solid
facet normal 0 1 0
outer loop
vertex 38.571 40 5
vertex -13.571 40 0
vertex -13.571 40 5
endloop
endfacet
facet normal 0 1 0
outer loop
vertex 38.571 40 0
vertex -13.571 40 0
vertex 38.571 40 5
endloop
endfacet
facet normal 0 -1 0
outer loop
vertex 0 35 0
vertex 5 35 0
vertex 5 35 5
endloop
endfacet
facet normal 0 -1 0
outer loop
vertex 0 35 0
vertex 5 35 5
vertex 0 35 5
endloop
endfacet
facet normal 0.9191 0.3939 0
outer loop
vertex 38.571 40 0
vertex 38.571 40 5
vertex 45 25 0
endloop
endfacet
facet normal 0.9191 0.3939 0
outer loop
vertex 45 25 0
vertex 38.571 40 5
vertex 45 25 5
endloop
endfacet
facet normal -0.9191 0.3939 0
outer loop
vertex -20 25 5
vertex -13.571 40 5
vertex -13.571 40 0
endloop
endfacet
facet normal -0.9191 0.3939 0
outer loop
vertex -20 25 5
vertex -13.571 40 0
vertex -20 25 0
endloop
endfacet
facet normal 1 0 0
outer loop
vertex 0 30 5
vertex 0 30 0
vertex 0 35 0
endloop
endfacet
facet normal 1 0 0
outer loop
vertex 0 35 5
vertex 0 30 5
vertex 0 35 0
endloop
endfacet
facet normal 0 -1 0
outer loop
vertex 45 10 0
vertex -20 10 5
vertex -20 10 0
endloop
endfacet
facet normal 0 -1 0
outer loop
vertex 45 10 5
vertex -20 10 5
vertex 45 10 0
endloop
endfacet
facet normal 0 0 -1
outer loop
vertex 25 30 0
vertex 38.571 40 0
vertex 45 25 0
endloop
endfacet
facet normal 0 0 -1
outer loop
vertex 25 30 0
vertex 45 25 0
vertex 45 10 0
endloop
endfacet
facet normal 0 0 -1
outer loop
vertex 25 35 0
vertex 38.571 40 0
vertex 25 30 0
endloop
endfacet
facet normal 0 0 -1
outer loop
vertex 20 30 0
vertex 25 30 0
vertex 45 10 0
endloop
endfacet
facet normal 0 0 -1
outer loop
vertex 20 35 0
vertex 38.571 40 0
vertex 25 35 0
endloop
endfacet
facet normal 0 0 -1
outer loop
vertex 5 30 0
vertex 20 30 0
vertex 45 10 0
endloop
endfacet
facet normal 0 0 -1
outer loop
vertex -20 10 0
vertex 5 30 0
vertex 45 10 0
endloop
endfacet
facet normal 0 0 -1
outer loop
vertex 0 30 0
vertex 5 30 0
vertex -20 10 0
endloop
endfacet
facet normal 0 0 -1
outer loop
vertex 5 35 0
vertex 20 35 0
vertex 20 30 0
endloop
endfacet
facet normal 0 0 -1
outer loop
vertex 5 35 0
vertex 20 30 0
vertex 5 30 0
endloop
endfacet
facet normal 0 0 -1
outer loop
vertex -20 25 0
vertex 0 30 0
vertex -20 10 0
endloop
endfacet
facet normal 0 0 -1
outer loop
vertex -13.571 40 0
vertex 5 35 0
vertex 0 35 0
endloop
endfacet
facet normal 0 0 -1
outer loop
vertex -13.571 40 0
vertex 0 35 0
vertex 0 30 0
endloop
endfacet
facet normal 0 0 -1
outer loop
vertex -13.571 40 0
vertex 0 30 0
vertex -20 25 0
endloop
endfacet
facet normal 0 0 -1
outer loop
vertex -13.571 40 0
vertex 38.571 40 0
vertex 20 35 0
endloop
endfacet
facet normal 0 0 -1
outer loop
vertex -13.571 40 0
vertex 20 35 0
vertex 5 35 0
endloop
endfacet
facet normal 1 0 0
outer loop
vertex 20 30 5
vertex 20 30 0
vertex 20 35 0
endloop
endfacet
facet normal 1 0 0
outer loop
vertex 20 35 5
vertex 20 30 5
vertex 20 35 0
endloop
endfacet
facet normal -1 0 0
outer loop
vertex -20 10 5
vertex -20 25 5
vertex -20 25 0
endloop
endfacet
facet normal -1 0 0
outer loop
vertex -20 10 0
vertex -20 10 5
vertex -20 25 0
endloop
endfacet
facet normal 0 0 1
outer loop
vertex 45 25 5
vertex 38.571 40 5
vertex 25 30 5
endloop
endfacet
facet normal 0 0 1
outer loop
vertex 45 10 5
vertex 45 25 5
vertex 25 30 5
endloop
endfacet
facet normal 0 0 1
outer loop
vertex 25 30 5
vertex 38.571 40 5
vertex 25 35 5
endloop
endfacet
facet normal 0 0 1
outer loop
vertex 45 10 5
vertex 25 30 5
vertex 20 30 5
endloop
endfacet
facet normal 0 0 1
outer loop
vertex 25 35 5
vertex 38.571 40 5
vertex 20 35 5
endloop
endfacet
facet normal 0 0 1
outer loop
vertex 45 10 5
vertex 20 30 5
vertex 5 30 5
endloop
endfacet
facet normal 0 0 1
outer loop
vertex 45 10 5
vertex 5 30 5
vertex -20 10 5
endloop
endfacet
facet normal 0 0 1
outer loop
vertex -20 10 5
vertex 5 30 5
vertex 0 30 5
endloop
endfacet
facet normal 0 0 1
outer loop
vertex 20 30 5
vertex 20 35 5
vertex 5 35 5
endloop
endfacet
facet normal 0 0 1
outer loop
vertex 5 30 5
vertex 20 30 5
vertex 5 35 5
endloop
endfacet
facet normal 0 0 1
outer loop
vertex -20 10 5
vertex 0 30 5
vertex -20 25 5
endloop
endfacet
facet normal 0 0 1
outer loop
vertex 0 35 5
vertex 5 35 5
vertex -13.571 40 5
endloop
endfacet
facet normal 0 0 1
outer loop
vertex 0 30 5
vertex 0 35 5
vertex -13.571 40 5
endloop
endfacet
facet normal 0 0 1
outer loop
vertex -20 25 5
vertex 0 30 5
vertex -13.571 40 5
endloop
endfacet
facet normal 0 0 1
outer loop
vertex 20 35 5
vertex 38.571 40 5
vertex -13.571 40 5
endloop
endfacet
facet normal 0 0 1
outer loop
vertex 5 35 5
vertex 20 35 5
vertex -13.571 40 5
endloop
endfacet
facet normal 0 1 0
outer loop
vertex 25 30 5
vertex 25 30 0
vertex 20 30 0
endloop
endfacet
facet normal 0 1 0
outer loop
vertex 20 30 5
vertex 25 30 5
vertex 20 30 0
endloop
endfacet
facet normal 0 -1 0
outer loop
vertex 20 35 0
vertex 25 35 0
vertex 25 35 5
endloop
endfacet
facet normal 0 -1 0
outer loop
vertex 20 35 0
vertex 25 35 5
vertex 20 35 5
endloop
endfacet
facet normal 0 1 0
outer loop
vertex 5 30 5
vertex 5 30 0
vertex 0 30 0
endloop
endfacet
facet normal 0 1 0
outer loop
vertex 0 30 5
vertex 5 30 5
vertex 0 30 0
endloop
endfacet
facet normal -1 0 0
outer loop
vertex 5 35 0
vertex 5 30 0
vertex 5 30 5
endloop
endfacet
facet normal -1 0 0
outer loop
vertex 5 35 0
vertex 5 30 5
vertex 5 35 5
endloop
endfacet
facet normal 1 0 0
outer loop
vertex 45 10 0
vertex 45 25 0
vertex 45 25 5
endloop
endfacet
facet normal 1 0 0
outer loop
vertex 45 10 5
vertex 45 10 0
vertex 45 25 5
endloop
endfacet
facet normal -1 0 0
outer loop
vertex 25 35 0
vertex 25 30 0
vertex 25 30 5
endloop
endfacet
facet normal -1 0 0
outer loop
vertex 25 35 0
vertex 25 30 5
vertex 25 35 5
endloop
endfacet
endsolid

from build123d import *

# Parameters (mm, degrees)
BOSS_EXTRUDE1_DEPTH  = 2
SKETCH2_W            = 5
SKETCH2_H            = 25
SKETCH2_W_2          = 20
BOSS_EXTRUDE2_DEPTH  = 20
SKETCH3_W            = 25
SKETCH3_H            = 2
BOSS_EXTRUDE3_DEPTH  = 25
SKETCH4_W            = 25
SKETCH4_H            = 25
BOSS_EXTRUDE4_DEPTH  = 7
BOSS_EXTRUDE5_DEPTH  = 5
SKETCH6_W            = 50
SKETCH6_H            = 25
BOSS_EXTRUDE6_DEPTH  = 5
BOSS_EXTRUDE7_DEPTH  = 30
CUT_EXTRUDE2_DEPTH   = 30
SKETCH10_W           = 5
SKETCH10_H           = 25
CUT_EXTRUDE3_DEPTH   = 20
SKETCH11_W           = 25
SKETCH11_H           = 25
CUT_EXTRUDE4_DEPTH   = 7
SKETCH13_W           = 5
SKETCH13_H           = 25
CUT_EXTRUDE5_DEPTH   = 10
BOSS_EXTRUDE8_REACH  = 12
SKETCH14_W           = 10
SKETCH14_H           = 5
SKETCH15_W           = 2.5
SKETCH15_H           = 25
CUT_EXTRUDE6_DEPTH   = 15
SKETCH16_W           = 5
SKETCH16_H           = 15
CUT_EXTRUDE7_DEPTH   = 26
SKETCH17_W           = 5
SKETCH17_H           = 15
CUT_EXTRUDE8_DEPTH   = 43.5
SKETCH18_W           = 5
SKETCH18_H           = 15
CUT_EXTRUDE9_DEPTH   = 6
CUT_EXTRUDE10_DEPTH  = 43.5
CUT_EXTRUDE11_DEPTH  = 43.5
SKETCH21_W           = 5
SKETCH21_H           = 5
SKETCH21_H_2         = 15
BOSS_EXTRUDE9_DEPTH  = 5
SKETCH22_W           = 5
SKETCH22_H           = 5
SKETCH22_W_2         = 50
SKETCH22_H_2         = 15
CUT_EXTRUDE12_DEPTH  = 6
SKETCH23_W           = 5
SKETCH23_H           = 5
CUT_EXTRUDE13_DEPTH  = 6
BOSS_EXTRUDE10_DEPTH = 15
BOSS_EXTRUDE11_DEPTH = 5
SKETCH26_W           = 65
SKETCH26_H           = 5
CUT_EXTRUDE14_DEPTH  = 20


with BuildPart() as part:
    # Sketch1 → Boss-Extrude1 (new body)
    with BuildSketch(Plane.XY):
        Polygon((-5, 75), (2.5, 25), (2.5, 0), (22.5, 0), (22.5, 25), (30, 75), (30, 100), (25, 100), (25, 75), (0, 75), (0, 100), (-5, 100), align=None)
    extrude(amount=BOSS_EXTRUDE1_DEPTH)

    # Sketch2 → Boss-Extrude2 (add)
    with BuildSketch(Plane(origin=(0, 0, 0), x_dir=(-1, 0, 0), z_dir=(0, 0, -1))):
        with Locations((-27.5, 87.5)):
            Rectangle(SKETCH2_W, SKETCH2_H)
        with Locations((2.5, 87.5)):
            Rectangle(SKETCH2_W, SKETCH2_H)
        with Locations((-12.5, 12.5)):
            Rectangle(SKETCH2_W_2, SKETCH2_H)
    extrude(amount=BOSS_EXTRUDE2_DEPTH)

    # Sketch3 → Boss-Extrude3 (add)
    with BuildSketch(Plane(origin=(0, 75, 0), x_dir=(1, 0, 0), z_dir=(0, 1, 0))):
        with Locations((12.5, -1)):
            Rectangle(SKETCH3_W, SKETCH3_H)
    extrude(amount=BOSS_EXTRUDE3_DEPTH)

    # Sketch4 → Boss-Extrude4 (add)
    with BuildSketch(Plane(origin=(0, 0, 0), x_dir=(-1, 0, 0), z_dir=(0, 0, -1))):
        with Locations((-12.5, 87.5)):
            Rectangle(SKETCH4_W, SKETCH4_H)
    extrude(amount=BOSS_EXTRUDE4_DEPTH)

    # Sketch5 → Boss-Extrude5 (add)
    with BuildSketch(Plane(origin=(0, 0, 0), x_dir=(-1, 0, 0), z_dir=(0, 0, -1))):
        Polygon((5, 75), (5, 0), (-2.5, 0), (-22.5, 0), (-30, 0), (-30, 75), (-30, 100), (5, 100), align=None)
    extrude(amount=-BOSS_EXTRUDE5_DEPTH)

    # Sketch6 → Boss-Extrude6 (add)
    with BuildSketch(Plane.XY.offset(5)):
        with Locations((12.5, 12.5)):
            Rectangle(SKETCH6_W, SKETCH6_H)
    extrude(amount=-BOSS_EXTRUDE6_DEPTH)

    # Sketch8 → Boss-Extrude7 (add)
    with BuildSketch(Plane.XZ.offset(-75)):
        Polygon((-5, 0), (-5, -20), (0, -20), (0, -7), (25, -7), (25, -20), (30, -20), (30, 0), align=None)
    extrude(amount=BOSS_EXTRUDE7_DEPTH)

    # Sketch9 → Cut-Extrude2 (cut)
    with BuildSketch(Plane(origin=(0, 100, 0), x_dir=(1, 0, 0), z_dir=(0, 1, 0))):
        Polygon((30, 20), (25, 20), (25, 7), (0, 7), (0, 20), (-5, 20), (-5, -5), (30, -5), align=None)
    extrude(amount=-CUT_EXTRUDE2_DEPTH, mode=Mode.SUBTRACT)

    # Sketch10 → Cut-Extrude3 (cut)
    with BuildSketch(Plane(origin=(0, 0, -20), x_dir=(-1, 0, 0), z_dir=(0, 0, -1))):
        with Locations((-20, 12.5)):
            Rectangle(SKETCH10_W, SKETCH10_H)
        with Locations((-5, 12.5)):
            Rectangle(SKETCH10_W, SKETCH10_H)
    extrude(amount=-CUT_EXTRUDE3_DEPTH, mode=Mode.SUBTRACT)

    # Sketch11 → Cut-Extrude4 (cut)
    with BuildSketch(Plane(origin=(0, 0, -7), x_dir=(-1, 0, 0), z_dir=(0, 0, -1))):
        with Locations((-12.5, 57.5)):
            Rectangle(SKETCH11_W, SKETCH11_H)
    extrude(amount=-CUT_EXTRUDE4_DEPTH, mode=Mode.SUBTRACT)

    # Sketch13 → Cut-Extrude5 (cut)
    with BuildSketch(Plane(origin=(17.5, 0, 0), x_dir=(0, 0, -1), z_dir=(1, 0, 0))):
        Polygon((5, 25), (5, 20), (10, 20), (10, 5), (0, 5), (0, 25), align=None)
        with Locations((17.5, 12.5)):
            Rectangle(SKETCH13_W, SKETCH13_H)
    extrude(amount=-CUT_EXTRUDE5_DEPTH, mode=Mode.SUBTRACT)

    # Sketch14 → Boss-Extrude8 (add, up to next)
    with BuildSketch(Plane.XY.offset(-5), mode=Mode.PRIVATE) as boss_extrude8_sk1:
        with Locations((12.5, 22.5)):
            Rectangle(SKETCH14_W, SKETCH14_H)
    boss_extrude8_tool1 = extrude(boss_extrude8_sk1.sketch, amount=BOSS_EXTRUDE8_REACH, mode=Mode.PRIVATE) - part.part
    add(boss_extrude8_tool1.solids().sort_by_distance((12.5, 22.5, -5))[0])

    # Sketch15 → Cut-Extrude6 (cut)
    with BuildSketch(Plane(origin=(0, 0, -15), x_dir=(-1, 0, 0), z_dir=(0, 0, -1))):
        with Locations((-8.75, 12.5)):
            Rectangle(SKETCH15_W, SKETCH15_H)
        with Locations((-16.25, 12.5)):
            Rectangle(SKETCH15_W, SKETCH15_H)
    extrude(amount=-CUT_EXTRUDE6_DEPTH, mode=Mode.SUBTRACT)

    # Sketch16 → Cut-Extrude7 (cut, through all)
    with BuildSketch(Plane.XY.offset(5)):
        with Locations((-5, 12.5)):
            Rectangle(SKETCH16_W, SKETCH16_H)
        with Locations((30, 12.5)):
            Rectangle(SKETCH16_W, SKETCH16_H)
    extrude(amount=-CUT_EXTRUDE7_DEPTH, mode=Mode.SUBTRACT)

    # Sketch17 → Cut-Extrude8 (cut, through all)
    with BuildSketch(Plane(origin=(30, 0, 0), x_dir=(0, 0, -1), z_dir=(1, 0, 0))):
        with Locations((2.5, 57.5)):
            Rectangle(SKETCH17_W, SKETCH17_H)
    extrude(amount=-CUT_EXTRUDE8_DEPTH, mode=Mode.SUBTRACT)

    # Sketch18 → Cut-Extrude9 (cut, through all)
    with BuildSketch(Plane(origin=(0, 0, 0), x_dir=(-1, 0, 0), z_dir=(0, 0, -1))):
        with Locations((-2.5, 57.5)):
            Rectangle(SKETCH18_W, SKETCH18_H)
        with Locations((-22.5, 57.5)):
            Rectangle(SKETCH18_W, SKETCH18_H)
    extrude(amount=-CUT_EXTRUDE9_DEPTH, mode=Mode.SUBTRACT)

    # Sketch19 → Cut-Extrude10 (cut, through all)
    with BuildSketch(Plane(origin=(30, 0, 0), x_dir=(0, 0, -1), z_dir=(1, 0, 0))):
        Polygon((5, 60), (10, 60), (10, 45), (20, 45), (20, 70), (-5, 70), (-5, 60), (0, 60), align=None)
    extrude(amount=-CUT_EXTRUDE10_DEPTH, mode=Mode.SUBTRACT)

    # Sketch20 → Cut-Extrude11 (cut, through all)
    with BuildSketch(Plane(origin=(30, 0, 0), x_dir=(0, 0, -1), z_dir=(1, 0, 0))):
        Polygon((10, 45), (15, 25), (15, 0), (0, 0), (0, 60), (10, 60), align=None)
    extrude(amount=-CUT_EXTRUDE11_DEPTH, mode=Mode.SUBTRACT)

    # Sketch21 → Boss-Extrude9 (add)
    with BuildSketch(Plane(origin=(0, 0, 0), x_dir=(-1, 0, 0), z_dir=(0, 0, -1))):
        with Locations((-2.5, 57.5)):
            Rectangle(SKETCH21_W, SKETCH21_H)
        with Locations((-22.5, 57.5)):
            Rectangle(SKETCH21_W, SKETCH21_H)
        with Locations((5, 12.5)):
            Rectangle(SKETCH21_W, SKETCH21_H_2)
        with Locations((-30, 12.5)):
            Rectangle(SKETCH21_W, SKETCH21_H_2)
    extrude(amount=-BOSS_EXTRUDE9_DEPTH)

    # Sketch22 → Cut-Extrude12 (cut, through all)
    with BuildSketch(Plane(origin=(0, 0, 0), x_dir=(-1, 0, 0), z_dir=(0, 0, -1))):
        with Locations((-12.5, 22.5)):
            Rectangle(SKETCH22_W, SKETCH22_H)
        with Locations((-12.5, 7.5)):
            Rectangle(SKETCH22_W_2, SKETCH22_H_2)
    extrude(amount=-CUT_EXTRUDE12_DEPTH, mode=Mode.SUBTRACT)

    # Sketch23 → Cut-Extrude13 (cut, through all)
    with BuildSketch(Plane(origin=(0, 0, 0), x_dir=(-1, 0, 0), z_dir=(0, 0, -1))):
        with Locations((-22.5, 32.5)):
            Rectangle(SKETCH23_W, SKETCH23_H)
        with Locations((-2.5, 32.5)):
            Rectangle(SKETCH23_W, SKETCH23_H)
    extrude(amount=-CUT_EXTRUDE13_DEPTH, mode=Mode.SUBTRACT)

    # Sketch24 → Boss-Extrude10 (add)
    with BuildSketch(Plane.XZ.offset(-25)):
        Polygon((-12.5, 5), (-20, 5), (-20, 0), (-12.5, 0), (37.5, 0), (45, 0), (45, 5), (37.5, 5), align=None)
    extrude(amount=BOSS_EXTRUDE10_DEPTH)

    # Sketch25 → Boss-Extrude11 (add, through all)
    with BuildSketch(Plane.XY.offset(5)):
        Polygon((45, 25), (30, 25), (30, 60), align=None)
        Polygon((-5, 25), (-5, 60), (-20, 25), align=None)
    extrude(amount=-BOSS_EXTRUDE11_DEPTH)

    # Sketch26 → Cut-Extrude14 (cut)
    with BuildSketch(Plane(origin=(0, 60, 0), x_dir=(1, 0, 0), z_dir=(0, 1, 0))):
        with Locations((12.5, -2.5)):
            Rectangle(SKETCH26_W, SKETCH26_H)
    extrude(amount=-CUT_EXTRUDE14_DEPTH, mode=Mode.SUBTRACT)


solid = part.part
